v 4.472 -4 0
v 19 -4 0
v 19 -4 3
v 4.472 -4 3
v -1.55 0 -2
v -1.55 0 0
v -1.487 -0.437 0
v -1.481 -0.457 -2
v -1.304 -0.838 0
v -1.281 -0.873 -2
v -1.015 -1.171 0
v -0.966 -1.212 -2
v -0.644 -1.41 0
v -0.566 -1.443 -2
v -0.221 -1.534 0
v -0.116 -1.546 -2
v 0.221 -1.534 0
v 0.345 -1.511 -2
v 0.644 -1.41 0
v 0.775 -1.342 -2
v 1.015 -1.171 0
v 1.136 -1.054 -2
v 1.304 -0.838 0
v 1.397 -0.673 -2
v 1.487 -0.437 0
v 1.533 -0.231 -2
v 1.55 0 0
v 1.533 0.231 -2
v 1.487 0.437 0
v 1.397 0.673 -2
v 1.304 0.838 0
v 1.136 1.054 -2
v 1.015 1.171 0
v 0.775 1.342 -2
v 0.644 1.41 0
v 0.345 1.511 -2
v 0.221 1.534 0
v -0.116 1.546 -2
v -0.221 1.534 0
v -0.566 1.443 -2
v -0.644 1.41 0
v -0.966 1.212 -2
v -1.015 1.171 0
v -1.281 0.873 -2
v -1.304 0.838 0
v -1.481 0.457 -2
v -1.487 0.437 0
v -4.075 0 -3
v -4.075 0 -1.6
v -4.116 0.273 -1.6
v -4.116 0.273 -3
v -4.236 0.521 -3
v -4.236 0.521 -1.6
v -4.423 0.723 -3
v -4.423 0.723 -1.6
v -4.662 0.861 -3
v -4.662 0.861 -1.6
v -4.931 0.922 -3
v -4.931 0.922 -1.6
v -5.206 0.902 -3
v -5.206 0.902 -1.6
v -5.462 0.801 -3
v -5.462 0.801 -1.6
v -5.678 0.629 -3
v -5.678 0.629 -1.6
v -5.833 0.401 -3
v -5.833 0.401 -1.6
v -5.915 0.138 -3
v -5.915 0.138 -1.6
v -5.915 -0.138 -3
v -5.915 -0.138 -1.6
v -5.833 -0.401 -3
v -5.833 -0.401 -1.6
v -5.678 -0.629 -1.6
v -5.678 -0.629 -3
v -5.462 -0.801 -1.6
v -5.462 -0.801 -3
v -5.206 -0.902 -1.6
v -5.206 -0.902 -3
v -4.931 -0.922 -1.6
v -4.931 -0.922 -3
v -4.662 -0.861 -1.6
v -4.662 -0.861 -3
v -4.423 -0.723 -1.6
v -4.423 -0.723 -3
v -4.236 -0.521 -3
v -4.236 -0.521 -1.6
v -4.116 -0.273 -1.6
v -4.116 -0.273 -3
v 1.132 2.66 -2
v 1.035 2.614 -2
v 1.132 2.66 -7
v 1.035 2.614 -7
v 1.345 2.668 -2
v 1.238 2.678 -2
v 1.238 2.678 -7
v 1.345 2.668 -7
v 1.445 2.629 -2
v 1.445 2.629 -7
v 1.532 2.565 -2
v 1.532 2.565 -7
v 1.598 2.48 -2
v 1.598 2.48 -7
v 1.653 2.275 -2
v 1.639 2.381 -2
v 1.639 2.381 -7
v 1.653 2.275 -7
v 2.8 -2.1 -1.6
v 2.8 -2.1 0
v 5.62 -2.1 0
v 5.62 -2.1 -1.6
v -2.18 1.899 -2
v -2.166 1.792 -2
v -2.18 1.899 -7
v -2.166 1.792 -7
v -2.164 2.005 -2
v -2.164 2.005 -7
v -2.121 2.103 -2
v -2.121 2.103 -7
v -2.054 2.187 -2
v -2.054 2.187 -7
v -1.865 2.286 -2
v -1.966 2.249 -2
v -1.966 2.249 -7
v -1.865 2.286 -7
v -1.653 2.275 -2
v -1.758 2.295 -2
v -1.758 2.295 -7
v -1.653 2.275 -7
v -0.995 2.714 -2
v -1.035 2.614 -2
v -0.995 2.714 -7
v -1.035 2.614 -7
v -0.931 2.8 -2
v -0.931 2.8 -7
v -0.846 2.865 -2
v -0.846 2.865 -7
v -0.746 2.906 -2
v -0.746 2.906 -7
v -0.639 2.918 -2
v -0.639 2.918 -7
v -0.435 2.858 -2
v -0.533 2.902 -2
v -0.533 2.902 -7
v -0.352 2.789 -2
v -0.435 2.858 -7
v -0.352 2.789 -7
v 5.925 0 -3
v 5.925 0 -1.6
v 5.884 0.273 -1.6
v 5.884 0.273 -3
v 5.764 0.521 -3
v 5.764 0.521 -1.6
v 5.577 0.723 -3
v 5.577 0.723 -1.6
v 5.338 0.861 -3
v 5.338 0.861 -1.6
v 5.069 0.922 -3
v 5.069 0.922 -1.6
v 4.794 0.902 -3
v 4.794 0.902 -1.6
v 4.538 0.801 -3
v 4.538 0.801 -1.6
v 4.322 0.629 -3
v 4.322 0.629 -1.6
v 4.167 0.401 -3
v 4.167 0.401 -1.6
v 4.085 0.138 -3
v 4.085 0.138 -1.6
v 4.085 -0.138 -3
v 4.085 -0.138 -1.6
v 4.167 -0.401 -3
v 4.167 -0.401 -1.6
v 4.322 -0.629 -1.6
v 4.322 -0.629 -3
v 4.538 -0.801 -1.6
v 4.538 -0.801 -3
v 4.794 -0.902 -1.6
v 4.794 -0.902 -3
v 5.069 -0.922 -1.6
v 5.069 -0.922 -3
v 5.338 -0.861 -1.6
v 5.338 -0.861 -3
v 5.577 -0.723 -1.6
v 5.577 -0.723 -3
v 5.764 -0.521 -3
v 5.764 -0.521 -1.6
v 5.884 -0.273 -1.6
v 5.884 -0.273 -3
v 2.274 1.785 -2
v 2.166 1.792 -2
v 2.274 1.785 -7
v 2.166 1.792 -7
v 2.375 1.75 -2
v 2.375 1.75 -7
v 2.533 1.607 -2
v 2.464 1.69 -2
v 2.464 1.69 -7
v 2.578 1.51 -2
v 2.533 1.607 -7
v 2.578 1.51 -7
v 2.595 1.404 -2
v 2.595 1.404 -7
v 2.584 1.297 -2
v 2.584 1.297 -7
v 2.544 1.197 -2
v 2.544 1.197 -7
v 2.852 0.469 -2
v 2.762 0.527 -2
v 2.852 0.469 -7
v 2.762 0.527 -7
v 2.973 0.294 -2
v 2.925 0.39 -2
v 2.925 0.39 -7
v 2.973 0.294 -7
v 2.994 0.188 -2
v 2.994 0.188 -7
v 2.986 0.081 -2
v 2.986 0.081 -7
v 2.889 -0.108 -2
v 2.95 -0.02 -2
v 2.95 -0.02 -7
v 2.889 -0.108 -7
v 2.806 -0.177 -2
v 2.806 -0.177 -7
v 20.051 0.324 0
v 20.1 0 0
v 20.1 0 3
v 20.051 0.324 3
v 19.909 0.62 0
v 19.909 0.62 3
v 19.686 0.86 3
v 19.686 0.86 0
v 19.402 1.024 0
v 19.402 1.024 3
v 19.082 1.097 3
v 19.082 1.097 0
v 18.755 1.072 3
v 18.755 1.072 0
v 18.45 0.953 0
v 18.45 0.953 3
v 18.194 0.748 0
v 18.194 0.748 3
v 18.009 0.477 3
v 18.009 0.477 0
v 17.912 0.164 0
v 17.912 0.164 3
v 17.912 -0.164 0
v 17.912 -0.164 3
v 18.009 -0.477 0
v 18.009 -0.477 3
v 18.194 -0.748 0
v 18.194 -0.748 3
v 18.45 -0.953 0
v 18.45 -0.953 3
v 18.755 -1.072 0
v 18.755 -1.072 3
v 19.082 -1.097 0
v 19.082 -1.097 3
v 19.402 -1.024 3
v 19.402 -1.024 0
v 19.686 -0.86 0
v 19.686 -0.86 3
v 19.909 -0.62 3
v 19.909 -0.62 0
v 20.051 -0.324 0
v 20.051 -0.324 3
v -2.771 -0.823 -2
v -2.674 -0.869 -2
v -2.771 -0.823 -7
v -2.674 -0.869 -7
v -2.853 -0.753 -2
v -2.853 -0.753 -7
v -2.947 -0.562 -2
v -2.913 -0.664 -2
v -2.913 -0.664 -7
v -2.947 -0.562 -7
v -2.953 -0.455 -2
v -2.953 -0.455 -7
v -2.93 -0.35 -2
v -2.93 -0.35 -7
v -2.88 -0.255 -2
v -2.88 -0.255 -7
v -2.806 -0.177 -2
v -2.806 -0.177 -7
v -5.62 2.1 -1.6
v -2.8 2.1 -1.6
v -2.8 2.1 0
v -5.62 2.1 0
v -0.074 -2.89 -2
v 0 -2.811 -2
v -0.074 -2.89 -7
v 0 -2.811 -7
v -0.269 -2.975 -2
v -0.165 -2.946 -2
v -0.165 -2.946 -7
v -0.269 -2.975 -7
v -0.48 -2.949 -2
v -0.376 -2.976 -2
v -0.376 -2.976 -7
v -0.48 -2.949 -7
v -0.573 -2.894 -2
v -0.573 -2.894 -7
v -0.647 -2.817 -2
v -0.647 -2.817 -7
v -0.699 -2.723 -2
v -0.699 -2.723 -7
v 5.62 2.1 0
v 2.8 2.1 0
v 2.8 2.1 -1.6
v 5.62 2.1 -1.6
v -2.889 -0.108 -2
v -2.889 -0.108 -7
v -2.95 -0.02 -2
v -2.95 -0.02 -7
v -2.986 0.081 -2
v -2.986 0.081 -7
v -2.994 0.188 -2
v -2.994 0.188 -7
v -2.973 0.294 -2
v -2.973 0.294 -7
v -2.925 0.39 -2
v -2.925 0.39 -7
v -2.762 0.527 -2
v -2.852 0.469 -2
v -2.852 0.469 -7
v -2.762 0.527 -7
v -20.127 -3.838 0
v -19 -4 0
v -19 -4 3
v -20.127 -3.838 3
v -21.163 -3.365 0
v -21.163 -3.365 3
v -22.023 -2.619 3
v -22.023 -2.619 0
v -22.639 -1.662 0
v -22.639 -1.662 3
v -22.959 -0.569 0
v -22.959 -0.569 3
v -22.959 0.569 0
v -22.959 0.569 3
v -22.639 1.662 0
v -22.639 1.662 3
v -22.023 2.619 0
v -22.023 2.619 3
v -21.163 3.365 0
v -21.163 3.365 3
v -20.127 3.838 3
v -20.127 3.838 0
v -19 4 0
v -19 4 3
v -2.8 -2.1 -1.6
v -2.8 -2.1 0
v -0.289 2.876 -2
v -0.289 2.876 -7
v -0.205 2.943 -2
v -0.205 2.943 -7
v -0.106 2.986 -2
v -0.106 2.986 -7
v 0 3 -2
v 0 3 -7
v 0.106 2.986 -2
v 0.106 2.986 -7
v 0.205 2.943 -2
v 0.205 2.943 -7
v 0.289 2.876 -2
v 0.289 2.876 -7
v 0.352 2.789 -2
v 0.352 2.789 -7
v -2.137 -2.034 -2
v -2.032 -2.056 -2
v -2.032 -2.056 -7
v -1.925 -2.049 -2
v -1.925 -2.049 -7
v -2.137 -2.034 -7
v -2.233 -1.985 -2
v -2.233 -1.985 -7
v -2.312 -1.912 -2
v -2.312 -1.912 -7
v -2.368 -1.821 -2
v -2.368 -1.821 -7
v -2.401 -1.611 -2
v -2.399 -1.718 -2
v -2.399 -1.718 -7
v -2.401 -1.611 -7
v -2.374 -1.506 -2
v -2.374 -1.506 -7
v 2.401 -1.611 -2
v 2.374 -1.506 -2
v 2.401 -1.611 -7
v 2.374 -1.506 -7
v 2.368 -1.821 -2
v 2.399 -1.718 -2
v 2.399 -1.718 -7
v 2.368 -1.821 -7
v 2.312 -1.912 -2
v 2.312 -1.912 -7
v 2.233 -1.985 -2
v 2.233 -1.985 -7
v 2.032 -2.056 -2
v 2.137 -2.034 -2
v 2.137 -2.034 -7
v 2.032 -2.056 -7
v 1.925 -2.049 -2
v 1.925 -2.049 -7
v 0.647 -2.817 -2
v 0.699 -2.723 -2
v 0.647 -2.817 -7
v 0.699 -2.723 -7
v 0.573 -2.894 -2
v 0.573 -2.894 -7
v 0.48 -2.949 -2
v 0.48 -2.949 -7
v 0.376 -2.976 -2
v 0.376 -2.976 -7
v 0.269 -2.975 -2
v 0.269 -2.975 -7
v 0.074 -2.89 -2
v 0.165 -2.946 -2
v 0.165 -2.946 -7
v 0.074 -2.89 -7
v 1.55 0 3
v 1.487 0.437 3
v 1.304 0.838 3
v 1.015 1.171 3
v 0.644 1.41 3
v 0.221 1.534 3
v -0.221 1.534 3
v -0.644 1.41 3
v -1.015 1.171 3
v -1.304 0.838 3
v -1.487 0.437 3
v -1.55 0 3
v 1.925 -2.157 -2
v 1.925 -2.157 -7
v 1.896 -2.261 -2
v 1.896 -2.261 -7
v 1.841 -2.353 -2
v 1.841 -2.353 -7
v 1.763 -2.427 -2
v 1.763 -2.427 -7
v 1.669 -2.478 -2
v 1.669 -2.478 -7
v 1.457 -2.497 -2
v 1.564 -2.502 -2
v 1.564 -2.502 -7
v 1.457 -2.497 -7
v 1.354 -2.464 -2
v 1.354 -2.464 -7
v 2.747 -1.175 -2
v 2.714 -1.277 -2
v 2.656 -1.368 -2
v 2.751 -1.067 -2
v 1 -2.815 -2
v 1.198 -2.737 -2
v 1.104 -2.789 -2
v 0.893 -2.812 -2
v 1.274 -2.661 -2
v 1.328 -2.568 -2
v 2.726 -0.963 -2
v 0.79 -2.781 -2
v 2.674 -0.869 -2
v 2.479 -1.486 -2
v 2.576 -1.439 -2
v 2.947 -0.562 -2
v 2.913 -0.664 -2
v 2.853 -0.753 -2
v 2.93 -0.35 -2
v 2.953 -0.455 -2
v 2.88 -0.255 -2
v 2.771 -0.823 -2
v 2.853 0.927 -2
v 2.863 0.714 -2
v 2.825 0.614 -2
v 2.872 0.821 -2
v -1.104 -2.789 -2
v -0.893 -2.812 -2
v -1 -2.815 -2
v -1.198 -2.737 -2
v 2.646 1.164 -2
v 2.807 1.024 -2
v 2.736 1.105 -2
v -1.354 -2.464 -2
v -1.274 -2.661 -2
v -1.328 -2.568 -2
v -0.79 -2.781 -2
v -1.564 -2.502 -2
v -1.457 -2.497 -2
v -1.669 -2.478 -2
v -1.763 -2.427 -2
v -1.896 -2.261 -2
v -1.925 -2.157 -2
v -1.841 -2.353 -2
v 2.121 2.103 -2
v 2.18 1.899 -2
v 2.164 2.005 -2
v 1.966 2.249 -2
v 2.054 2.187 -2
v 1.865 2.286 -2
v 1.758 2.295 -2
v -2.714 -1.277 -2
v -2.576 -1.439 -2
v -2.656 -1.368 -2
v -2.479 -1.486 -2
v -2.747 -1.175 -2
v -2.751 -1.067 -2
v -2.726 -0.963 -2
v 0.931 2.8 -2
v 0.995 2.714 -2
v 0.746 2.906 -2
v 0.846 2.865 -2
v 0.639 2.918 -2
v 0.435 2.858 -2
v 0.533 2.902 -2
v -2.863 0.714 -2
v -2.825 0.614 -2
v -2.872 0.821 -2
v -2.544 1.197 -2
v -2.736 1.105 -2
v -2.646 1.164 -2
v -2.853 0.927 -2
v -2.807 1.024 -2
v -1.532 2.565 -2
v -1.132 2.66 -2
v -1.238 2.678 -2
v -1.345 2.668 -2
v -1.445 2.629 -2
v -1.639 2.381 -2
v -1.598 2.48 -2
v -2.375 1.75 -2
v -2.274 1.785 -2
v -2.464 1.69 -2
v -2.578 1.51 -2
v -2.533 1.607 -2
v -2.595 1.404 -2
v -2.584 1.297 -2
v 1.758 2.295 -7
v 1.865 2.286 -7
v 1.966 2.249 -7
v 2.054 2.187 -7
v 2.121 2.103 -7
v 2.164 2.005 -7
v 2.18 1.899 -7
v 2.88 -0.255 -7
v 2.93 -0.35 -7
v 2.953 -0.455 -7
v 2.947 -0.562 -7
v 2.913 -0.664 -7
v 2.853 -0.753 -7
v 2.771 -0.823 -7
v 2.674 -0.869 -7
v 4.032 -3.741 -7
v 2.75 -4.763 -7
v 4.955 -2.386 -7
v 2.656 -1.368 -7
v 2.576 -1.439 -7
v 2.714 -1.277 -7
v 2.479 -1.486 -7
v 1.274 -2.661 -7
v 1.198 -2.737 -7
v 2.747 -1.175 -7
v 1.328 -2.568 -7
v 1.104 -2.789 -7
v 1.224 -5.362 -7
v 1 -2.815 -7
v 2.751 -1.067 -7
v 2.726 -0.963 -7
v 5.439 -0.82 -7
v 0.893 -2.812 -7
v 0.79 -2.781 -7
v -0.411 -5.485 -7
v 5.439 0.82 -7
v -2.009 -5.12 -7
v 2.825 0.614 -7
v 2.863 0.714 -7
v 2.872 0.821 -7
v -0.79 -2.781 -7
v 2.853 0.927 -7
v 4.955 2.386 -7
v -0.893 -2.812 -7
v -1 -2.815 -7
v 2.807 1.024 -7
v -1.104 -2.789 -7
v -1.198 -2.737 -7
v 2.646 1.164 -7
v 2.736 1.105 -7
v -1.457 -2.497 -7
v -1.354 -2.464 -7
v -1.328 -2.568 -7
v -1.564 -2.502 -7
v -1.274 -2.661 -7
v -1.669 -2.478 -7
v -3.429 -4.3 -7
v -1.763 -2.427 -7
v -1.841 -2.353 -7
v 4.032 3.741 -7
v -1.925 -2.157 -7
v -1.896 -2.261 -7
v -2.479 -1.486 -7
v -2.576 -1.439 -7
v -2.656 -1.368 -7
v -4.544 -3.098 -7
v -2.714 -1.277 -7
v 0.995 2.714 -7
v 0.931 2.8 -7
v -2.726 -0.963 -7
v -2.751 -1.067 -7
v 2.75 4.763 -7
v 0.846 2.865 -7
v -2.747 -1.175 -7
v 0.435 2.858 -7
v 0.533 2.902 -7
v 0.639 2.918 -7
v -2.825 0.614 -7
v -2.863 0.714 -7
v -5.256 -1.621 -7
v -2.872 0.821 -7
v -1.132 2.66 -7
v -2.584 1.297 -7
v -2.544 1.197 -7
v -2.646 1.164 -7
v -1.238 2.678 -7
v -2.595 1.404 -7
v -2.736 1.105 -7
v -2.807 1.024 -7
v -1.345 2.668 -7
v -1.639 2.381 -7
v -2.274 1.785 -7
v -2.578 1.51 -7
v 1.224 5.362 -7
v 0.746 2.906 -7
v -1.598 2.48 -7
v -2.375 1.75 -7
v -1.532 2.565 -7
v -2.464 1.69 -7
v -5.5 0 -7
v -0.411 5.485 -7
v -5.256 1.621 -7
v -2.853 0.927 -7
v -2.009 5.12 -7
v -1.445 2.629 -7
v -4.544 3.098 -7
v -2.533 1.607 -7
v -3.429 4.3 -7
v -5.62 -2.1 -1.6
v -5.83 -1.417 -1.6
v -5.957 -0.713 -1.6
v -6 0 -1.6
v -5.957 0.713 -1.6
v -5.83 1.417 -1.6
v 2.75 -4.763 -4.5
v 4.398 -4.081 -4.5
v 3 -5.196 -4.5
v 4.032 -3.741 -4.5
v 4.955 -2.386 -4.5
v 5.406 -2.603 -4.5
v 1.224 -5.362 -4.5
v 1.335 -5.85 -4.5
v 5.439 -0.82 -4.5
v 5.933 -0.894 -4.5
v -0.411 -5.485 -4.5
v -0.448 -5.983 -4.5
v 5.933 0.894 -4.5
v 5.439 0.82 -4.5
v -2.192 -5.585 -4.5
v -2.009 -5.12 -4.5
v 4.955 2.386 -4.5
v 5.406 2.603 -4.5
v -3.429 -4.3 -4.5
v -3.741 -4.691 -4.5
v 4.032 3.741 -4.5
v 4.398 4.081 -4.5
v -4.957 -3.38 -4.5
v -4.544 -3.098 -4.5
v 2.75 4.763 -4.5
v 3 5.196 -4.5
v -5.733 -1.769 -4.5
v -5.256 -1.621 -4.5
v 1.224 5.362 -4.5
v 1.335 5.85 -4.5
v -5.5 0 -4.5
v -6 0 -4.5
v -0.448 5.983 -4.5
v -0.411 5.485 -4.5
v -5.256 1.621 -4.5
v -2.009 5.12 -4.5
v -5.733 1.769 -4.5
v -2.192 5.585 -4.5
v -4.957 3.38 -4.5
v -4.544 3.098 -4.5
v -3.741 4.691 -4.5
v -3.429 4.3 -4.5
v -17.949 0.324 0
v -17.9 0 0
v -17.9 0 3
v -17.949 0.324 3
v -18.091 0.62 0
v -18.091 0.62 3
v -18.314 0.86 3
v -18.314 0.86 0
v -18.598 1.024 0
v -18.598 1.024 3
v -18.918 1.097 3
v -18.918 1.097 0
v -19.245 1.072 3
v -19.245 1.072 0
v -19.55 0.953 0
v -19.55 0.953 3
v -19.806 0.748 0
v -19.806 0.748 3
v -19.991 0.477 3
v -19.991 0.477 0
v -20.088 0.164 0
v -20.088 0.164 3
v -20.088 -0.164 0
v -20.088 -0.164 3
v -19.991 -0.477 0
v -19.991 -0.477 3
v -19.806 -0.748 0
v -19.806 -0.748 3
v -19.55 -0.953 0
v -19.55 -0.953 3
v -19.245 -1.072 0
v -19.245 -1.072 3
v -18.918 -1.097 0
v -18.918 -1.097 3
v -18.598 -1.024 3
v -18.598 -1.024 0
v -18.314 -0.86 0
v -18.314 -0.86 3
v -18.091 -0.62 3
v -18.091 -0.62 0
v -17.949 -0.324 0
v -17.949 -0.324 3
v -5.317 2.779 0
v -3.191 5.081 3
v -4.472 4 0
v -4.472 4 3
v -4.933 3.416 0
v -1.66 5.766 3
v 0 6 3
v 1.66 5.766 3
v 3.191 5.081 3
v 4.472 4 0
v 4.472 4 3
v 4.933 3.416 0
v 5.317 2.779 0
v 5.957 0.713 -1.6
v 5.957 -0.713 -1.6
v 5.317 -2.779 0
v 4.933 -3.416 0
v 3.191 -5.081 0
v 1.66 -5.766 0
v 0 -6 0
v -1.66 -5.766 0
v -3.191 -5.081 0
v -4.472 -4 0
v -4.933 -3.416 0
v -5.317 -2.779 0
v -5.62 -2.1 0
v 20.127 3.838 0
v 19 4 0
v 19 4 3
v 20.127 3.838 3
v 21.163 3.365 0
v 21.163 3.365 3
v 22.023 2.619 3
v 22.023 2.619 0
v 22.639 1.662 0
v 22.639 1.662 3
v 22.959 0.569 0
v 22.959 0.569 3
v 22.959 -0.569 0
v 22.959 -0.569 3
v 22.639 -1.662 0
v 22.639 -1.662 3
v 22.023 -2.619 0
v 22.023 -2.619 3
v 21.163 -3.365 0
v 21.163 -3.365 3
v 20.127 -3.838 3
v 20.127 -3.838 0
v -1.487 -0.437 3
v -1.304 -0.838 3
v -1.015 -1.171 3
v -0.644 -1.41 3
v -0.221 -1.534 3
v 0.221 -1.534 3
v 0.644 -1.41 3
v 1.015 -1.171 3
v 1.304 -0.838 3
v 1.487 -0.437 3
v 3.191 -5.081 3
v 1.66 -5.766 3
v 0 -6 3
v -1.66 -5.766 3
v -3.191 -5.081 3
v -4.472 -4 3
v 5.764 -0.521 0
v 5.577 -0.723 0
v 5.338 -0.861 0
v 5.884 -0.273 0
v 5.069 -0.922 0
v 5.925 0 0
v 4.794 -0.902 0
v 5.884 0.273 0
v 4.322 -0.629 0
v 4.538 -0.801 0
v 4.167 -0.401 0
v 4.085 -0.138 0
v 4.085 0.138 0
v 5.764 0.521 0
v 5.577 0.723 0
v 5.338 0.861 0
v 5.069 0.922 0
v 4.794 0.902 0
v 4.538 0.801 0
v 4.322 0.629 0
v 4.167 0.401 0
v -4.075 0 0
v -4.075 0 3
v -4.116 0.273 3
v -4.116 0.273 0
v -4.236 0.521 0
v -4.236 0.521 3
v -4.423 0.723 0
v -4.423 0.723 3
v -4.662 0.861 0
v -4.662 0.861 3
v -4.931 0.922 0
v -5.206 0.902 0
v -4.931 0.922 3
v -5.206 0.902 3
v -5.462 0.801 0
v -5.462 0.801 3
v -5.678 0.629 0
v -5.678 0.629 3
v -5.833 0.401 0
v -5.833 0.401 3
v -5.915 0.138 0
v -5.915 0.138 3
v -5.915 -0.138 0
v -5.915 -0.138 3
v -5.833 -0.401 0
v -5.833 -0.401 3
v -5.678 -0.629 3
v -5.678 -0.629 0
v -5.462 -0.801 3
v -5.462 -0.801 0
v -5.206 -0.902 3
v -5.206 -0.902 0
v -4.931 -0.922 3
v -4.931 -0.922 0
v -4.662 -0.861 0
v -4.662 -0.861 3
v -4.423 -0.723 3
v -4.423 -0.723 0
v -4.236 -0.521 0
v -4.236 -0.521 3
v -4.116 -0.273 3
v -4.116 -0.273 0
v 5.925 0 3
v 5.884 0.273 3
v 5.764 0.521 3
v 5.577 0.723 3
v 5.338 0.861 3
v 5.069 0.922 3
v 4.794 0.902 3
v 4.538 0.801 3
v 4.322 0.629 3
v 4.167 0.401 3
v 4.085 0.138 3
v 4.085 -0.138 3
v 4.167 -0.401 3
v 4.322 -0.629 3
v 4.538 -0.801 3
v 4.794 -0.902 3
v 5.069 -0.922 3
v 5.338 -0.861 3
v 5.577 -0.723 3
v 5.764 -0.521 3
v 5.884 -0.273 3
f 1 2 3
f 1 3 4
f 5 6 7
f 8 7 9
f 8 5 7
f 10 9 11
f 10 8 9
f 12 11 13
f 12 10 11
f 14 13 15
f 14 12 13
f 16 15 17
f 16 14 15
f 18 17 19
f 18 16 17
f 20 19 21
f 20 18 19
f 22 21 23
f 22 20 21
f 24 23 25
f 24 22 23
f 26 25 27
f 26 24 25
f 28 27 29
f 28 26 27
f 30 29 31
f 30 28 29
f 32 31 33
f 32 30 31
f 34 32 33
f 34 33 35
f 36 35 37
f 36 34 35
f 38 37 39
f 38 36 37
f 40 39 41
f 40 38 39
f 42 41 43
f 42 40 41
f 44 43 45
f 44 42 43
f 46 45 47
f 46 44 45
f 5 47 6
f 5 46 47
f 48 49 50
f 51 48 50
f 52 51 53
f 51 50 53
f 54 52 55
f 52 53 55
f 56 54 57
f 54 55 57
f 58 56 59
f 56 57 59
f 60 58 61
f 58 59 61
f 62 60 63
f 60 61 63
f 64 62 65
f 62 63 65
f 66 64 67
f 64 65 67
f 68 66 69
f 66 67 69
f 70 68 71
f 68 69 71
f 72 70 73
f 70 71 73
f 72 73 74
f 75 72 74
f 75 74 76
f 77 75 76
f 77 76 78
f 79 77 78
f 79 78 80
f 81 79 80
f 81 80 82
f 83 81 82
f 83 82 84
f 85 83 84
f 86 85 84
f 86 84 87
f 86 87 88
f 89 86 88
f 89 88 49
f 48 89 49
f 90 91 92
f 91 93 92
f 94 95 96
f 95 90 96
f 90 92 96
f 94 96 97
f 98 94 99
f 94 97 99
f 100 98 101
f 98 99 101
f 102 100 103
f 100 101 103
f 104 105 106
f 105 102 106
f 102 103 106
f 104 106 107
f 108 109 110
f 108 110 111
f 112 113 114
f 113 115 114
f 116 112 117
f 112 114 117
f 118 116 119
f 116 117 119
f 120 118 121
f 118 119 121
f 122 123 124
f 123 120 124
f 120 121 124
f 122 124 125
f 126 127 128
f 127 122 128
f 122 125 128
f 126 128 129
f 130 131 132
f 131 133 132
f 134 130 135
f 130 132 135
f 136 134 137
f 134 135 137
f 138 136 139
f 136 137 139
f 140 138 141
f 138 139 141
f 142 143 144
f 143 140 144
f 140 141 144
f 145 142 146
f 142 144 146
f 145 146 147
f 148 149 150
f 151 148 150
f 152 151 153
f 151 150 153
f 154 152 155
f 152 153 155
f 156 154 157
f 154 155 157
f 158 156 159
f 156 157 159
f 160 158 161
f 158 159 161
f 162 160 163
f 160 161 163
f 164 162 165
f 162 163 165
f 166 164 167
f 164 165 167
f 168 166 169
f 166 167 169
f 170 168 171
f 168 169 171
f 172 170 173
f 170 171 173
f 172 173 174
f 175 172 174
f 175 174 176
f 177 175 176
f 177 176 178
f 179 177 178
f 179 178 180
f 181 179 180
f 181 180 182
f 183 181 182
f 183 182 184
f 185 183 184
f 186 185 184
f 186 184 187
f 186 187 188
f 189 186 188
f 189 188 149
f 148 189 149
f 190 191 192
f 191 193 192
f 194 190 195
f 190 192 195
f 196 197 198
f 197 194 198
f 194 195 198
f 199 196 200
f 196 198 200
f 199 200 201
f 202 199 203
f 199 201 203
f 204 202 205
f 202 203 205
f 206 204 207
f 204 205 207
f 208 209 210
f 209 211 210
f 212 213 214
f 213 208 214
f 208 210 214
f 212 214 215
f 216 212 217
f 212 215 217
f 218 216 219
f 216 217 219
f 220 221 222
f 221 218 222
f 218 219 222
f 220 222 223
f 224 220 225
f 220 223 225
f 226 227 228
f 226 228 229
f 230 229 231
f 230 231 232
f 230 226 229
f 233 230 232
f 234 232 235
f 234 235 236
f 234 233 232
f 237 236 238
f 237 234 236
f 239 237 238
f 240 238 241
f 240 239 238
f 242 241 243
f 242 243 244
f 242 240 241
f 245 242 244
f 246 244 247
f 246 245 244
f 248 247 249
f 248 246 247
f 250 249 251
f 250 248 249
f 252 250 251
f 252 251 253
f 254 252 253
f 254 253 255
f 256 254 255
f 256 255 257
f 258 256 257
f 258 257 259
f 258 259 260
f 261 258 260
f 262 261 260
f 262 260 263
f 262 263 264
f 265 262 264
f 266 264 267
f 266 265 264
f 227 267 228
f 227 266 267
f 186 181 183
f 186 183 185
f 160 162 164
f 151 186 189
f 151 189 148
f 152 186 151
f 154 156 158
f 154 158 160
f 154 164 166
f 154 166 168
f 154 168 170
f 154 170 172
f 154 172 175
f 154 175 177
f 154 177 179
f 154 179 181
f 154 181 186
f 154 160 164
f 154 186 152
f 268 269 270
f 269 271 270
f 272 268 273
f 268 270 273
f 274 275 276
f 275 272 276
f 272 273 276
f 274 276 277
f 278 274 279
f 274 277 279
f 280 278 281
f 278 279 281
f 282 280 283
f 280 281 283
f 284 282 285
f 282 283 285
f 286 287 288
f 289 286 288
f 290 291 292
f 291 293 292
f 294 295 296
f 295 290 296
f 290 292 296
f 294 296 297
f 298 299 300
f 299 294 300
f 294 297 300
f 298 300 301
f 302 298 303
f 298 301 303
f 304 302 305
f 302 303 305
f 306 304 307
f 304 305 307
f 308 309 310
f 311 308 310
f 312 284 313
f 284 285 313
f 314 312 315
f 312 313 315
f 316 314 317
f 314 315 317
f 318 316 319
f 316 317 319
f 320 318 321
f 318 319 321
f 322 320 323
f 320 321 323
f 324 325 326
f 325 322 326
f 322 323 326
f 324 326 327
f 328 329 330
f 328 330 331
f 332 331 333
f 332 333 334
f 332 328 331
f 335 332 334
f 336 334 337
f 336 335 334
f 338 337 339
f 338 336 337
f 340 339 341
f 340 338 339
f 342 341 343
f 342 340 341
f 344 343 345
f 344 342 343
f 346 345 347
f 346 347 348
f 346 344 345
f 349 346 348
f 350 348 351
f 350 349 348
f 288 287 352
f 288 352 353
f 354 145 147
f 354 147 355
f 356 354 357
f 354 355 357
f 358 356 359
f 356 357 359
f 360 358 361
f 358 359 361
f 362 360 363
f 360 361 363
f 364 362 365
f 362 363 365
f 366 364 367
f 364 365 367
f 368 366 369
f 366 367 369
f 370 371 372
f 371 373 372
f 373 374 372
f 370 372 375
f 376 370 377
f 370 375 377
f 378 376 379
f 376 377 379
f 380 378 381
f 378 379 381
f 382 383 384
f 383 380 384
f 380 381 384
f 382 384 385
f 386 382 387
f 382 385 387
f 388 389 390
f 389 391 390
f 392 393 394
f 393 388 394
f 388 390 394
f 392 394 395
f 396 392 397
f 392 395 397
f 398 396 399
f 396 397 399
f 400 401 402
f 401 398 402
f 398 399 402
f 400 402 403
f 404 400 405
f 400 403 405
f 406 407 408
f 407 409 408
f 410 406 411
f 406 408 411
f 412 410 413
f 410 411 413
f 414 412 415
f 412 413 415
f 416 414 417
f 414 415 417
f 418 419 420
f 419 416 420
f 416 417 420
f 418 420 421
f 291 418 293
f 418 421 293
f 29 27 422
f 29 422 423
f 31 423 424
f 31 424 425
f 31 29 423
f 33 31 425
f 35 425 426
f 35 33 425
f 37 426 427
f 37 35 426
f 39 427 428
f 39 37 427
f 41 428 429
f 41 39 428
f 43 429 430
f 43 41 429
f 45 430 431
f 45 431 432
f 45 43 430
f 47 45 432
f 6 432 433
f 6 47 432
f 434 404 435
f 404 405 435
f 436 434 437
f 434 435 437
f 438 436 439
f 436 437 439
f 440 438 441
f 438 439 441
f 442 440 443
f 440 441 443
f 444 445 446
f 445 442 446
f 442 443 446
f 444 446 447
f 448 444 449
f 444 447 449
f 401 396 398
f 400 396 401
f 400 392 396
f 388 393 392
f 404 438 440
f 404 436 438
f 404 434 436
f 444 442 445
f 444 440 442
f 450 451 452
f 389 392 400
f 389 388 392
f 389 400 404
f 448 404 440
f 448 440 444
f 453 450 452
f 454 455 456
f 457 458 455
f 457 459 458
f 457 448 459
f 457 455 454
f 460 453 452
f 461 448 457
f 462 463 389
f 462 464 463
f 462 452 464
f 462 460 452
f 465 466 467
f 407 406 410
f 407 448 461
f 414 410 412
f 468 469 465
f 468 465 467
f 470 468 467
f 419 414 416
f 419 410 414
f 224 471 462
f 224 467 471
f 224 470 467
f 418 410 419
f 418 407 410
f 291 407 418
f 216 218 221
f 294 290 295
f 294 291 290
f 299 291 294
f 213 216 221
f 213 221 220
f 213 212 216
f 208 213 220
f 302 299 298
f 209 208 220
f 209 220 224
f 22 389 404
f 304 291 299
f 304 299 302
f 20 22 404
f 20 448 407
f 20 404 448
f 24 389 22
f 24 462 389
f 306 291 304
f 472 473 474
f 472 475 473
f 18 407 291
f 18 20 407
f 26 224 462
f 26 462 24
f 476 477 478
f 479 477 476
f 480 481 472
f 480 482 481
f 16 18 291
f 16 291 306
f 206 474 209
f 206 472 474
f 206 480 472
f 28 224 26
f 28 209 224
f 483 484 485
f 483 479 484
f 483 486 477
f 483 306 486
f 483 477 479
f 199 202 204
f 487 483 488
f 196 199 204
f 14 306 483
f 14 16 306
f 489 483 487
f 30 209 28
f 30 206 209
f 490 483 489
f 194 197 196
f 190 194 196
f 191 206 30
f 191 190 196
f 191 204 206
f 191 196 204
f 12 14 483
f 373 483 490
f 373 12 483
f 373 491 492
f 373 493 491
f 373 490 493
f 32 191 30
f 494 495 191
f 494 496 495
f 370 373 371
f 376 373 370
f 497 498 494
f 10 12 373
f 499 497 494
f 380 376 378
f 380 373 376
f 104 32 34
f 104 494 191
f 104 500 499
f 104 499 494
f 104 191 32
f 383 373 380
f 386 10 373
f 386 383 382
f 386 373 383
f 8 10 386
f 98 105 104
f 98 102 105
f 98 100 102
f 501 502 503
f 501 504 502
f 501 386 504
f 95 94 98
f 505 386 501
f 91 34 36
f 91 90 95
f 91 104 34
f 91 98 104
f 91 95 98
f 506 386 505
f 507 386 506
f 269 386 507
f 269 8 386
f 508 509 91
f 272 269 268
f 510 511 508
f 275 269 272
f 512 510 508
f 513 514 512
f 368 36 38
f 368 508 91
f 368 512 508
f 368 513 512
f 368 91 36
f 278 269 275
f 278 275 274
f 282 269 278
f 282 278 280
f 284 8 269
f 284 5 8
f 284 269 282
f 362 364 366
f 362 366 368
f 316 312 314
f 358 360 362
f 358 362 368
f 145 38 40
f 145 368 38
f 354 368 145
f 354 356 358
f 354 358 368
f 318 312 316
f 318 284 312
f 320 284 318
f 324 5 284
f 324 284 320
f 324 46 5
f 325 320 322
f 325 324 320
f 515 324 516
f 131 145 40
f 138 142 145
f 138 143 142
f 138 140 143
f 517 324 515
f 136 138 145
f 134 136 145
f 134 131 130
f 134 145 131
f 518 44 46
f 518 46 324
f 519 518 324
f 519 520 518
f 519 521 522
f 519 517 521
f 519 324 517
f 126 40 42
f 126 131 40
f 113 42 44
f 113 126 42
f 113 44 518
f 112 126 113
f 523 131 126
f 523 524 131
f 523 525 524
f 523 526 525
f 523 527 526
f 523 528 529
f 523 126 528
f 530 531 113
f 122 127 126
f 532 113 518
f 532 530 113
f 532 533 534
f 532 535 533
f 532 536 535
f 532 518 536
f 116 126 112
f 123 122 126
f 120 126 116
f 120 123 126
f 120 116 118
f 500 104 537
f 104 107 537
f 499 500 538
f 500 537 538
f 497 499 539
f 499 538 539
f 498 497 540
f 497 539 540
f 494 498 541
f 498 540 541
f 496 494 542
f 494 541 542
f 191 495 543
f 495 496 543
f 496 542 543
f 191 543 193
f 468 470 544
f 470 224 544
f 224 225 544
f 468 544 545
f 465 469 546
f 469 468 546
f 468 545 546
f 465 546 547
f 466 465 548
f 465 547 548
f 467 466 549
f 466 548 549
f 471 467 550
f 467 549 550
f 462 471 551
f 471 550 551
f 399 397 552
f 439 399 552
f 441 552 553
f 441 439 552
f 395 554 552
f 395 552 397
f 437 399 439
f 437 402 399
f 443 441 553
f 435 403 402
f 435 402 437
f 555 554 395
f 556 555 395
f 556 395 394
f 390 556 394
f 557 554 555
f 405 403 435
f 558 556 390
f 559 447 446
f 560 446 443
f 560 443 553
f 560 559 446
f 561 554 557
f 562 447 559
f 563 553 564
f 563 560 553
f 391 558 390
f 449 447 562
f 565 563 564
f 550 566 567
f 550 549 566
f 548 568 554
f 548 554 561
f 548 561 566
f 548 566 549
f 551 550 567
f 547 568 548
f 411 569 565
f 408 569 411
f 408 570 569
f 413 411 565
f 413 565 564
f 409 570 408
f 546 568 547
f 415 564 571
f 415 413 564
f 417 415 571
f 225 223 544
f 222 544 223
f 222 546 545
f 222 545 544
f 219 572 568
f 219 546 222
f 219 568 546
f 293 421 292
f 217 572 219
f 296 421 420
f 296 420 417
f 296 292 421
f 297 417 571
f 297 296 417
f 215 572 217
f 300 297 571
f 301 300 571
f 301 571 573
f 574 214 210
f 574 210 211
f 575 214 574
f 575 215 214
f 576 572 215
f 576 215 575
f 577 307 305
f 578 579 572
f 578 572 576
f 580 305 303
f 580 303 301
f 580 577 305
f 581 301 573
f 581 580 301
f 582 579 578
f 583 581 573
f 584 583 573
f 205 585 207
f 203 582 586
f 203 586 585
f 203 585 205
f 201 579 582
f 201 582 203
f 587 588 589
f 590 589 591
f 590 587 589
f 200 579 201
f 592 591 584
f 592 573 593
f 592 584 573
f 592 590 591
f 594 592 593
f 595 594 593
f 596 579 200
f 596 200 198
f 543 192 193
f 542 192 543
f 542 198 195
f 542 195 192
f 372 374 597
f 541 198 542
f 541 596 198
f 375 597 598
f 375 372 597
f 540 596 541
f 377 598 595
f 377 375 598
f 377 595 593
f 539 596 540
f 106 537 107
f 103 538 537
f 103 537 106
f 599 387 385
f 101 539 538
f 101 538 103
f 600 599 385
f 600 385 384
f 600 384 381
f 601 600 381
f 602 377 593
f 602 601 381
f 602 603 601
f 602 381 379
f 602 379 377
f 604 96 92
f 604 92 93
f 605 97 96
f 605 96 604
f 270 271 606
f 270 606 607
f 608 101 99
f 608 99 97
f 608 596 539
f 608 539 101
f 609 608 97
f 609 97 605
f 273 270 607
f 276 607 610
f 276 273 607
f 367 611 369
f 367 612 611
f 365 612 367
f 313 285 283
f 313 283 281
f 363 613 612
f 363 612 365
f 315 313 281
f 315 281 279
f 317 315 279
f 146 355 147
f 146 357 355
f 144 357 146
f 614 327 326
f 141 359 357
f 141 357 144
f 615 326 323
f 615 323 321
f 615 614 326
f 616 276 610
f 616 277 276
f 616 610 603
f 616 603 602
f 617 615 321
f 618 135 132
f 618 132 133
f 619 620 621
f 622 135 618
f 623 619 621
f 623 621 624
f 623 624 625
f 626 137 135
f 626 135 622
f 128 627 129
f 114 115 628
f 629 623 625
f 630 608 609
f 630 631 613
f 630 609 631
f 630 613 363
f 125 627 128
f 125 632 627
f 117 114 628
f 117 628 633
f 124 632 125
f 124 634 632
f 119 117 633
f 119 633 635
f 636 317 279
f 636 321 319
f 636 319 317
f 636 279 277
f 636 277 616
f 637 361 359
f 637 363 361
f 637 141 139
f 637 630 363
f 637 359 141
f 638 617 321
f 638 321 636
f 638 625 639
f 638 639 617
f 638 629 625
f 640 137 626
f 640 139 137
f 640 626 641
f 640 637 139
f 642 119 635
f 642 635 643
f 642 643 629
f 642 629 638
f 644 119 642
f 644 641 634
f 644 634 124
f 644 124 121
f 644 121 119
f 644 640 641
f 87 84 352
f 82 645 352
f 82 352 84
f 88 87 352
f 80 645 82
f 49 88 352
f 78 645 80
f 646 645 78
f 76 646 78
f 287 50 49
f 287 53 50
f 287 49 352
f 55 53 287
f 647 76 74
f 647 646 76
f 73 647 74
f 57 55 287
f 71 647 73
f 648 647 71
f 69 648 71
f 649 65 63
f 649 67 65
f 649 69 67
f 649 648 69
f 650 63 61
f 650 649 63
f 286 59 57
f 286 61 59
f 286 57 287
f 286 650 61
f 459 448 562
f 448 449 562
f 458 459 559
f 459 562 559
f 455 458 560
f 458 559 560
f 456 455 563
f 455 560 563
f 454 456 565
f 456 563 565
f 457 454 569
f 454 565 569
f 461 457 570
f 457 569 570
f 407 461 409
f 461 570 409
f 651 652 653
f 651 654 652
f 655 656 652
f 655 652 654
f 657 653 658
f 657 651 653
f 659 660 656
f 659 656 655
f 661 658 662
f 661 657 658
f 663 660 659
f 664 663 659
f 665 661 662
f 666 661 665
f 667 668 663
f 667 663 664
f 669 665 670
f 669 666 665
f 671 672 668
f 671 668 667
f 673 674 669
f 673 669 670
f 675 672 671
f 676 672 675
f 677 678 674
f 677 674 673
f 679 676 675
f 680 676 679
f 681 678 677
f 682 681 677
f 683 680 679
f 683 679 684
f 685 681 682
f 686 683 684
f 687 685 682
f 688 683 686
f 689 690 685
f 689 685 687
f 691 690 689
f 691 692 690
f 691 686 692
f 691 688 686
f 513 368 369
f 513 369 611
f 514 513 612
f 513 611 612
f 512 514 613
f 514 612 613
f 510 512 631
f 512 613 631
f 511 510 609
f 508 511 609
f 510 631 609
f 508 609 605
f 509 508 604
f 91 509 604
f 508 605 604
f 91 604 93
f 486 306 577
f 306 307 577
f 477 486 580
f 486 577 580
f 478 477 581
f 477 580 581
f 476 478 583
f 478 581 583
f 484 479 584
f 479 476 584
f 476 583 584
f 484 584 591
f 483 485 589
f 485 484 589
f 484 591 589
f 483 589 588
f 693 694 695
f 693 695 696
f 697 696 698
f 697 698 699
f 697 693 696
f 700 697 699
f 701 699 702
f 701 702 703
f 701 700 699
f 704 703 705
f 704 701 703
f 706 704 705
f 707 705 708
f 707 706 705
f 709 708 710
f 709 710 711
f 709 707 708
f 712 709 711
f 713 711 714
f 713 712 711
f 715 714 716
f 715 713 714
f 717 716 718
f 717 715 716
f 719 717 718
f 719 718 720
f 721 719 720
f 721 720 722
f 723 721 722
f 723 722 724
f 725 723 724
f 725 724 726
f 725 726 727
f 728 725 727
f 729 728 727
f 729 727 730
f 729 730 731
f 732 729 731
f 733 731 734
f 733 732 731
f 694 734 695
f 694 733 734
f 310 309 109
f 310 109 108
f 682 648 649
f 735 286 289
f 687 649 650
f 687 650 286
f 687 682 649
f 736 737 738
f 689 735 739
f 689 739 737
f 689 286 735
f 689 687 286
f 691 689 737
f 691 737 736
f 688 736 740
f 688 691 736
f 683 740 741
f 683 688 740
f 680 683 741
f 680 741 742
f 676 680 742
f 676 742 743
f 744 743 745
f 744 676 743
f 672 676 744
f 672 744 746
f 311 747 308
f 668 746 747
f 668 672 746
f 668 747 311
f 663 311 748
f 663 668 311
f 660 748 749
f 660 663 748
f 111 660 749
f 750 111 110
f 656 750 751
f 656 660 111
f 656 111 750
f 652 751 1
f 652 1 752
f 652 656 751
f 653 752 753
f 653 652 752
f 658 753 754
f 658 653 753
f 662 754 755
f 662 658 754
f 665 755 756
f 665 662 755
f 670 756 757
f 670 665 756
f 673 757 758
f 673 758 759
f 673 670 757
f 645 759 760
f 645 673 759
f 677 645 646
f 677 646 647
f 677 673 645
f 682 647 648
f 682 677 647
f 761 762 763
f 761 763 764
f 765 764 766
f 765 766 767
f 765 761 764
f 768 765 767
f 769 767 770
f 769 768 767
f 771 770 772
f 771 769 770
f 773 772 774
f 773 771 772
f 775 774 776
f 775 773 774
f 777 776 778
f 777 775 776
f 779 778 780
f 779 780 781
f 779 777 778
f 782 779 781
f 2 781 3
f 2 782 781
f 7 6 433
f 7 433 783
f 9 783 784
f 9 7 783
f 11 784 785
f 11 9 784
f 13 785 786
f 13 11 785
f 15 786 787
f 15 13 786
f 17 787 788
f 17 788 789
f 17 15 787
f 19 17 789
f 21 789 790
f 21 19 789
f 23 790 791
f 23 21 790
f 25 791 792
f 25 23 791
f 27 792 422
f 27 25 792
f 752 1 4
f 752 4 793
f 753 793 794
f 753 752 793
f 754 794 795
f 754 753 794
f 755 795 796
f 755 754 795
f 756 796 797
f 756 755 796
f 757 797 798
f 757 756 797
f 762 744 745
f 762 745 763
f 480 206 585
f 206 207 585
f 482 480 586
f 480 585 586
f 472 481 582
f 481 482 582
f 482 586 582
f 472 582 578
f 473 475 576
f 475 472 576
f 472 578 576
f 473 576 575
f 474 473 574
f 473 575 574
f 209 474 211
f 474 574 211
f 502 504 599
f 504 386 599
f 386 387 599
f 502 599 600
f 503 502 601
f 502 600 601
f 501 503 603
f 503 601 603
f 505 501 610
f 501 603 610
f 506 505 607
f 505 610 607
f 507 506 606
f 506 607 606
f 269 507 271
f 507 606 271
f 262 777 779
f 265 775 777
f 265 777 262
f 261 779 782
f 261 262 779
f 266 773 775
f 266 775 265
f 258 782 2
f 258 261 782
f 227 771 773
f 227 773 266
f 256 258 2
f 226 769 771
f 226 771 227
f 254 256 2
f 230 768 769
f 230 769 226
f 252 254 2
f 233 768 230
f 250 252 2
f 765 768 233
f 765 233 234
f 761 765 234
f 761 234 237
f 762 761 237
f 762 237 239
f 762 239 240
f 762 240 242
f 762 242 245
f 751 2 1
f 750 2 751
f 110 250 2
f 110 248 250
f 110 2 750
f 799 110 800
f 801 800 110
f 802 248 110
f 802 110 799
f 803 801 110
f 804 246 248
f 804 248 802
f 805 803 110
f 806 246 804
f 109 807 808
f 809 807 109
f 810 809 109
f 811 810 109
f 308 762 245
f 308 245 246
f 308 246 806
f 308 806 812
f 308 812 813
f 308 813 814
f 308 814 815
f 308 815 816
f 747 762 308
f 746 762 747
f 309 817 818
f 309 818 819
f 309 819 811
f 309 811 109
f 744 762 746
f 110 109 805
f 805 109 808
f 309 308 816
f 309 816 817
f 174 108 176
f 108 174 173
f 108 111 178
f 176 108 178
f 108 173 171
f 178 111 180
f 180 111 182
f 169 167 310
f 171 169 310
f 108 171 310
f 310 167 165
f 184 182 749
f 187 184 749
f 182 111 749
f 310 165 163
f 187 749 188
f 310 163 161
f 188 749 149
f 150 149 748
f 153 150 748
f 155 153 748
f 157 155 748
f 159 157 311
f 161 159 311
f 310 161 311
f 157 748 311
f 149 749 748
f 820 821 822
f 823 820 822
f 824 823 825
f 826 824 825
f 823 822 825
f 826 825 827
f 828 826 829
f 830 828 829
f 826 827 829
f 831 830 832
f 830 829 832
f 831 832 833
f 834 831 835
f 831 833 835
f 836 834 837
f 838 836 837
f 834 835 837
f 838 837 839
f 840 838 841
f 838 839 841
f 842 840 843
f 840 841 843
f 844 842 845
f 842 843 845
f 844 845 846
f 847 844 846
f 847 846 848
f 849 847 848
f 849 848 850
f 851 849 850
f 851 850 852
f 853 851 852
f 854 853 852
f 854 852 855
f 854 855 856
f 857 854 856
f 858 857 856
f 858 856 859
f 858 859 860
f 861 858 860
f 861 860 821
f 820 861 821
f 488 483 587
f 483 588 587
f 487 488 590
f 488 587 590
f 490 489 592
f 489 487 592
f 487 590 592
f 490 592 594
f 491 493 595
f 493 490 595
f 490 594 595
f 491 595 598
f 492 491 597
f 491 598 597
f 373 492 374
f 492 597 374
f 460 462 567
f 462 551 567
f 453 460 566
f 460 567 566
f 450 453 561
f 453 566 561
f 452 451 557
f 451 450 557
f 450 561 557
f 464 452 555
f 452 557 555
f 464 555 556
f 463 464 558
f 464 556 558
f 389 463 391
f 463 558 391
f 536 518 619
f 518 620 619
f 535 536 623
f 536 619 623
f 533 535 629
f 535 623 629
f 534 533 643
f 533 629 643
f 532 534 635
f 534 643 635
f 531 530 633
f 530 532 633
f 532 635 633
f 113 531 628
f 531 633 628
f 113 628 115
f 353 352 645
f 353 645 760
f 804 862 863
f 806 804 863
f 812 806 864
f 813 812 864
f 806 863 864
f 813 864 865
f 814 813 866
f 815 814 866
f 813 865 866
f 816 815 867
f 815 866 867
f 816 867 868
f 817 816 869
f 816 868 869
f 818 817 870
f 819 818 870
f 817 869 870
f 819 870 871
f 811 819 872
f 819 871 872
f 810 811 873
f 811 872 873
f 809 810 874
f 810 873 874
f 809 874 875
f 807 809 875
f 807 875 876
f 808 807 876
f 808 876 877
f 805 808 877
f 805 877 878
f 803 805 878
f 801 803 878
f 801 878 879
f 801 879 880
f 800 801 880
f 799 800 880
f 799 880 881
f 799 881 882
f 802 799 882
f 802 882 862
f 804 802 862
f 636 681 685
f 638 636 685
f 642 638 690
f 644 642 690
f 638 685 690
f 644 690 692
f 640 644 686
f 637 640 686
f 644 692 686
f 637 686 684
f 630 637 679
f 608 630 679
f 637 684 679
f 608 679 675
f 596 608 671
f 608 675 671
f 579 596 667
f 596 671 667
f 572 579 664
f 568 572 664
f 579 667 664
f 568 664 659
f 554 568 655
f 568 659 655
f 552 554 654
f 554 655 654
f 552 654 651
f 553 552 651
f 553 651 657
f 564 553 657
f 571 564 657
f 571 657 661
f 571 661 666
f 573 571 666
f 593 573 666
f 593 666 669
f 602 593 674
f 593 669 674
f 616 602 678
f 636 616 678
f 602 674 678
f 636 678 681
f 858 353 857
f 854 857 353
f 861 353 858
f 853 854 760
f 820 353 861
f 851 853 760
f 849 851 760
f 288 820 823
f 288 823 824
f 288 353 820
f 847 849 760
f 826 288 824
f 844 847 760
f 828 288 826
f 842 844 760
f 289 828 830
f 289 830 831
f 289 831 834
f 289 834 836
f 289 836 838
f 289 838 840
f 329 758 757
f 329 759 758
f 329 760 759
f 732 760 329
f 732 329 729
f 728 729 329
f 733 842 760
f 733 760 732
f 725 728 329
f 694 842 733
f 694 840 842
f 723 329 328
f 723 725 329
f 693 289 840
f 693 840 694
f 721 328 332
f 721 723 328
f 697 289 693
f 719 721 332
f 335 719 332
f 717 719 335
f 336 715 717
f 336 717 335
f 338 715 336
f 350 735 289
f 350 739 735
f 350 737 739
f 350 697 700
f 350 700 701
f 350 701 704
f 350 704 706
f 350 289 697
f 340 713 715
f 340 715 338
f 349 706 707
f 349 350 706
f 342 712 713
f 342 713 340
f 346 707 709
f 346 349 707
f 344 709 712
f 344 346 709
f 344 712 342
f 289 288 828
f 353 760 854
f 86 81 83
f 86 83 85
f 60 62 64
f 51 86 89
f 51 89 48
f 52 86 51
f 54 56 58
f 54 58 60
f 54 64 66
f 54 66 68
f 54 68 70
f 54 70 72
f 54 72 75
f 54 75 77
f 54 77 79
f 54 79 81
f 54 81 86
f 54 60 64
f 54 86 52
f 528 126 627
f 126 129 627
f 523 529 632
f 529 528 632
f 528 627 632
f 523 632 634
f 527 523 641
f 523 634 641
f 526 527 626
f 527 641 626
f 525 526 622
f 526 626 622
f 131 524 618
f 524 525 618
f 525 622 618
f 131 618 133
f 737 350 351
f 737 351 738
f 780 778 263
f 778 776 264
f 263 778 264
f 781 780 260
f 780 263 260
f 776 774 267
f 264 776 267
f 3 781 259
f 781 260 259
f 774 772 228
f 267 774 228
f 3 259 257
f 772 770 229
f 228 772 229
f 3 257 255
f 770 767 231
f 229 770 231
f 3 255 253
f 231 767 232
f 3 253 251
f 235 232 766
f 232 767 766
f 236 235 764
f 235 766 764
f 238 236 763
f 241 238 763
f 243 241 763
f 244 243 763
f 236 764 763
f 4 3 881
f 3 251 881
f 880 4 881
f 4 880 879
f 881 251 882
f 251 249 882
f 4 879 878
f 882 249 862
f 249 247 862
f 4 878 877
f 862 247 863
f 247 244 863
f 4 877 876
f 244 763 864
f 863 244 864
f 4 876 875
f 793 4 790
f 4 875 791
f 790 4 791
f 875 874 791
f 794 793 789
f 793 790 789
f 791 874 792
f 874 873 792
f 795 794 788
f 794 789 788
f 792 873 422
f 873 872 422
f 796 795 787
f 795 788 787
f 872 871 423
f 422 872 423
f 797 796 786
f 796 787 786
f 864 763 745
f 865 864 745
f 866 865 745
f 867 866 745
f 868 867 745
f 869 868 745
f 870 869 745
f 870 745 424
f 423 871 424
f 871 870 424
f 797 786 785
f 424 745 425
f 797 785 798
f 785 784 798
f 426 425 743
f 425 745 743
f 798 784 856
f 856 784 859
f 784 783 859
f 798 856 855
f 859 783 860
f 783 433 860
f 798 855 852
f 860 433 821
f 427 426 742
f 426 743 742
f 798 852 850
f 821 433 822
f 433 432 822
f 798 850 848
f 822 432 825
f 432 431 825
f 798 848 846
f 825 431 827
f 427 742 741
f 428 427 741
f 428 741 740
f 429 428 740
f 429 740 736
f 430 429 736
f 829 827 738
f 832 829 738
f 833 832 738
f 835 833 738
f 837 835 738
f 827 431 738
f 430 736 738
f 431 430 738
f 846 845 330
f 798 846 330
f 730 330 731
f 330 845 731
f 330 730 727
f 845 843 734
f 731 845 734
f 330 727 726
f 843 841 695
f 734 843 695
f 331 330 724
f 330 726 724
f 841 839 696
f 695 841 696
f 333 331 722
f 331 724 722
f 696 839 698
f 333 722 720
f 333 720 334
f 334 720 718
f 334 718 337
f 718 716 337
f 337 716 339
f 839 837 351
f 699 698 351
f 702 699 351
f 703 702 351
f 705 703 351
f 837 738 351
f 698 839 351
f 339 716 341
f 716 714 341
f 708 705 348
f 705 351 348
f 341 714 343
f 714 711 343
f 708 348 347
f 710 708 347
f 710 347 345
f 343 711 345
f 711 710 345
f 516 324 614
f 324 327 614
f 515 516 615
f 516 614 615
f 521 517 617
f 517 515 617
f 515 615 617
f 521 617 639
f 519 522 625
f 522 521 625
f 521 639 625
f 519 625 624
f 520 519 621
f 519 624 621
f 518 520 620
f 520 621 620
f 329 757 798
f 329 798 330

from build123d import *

# Parameters (mm, degrees)
SKETCH_1_R               = 1.55
SKETCH_1_R_2             = 1.1
EXTRUDE_1_DEPTH          = 3
EXTRUDE_START            = 4.5
SKETCH_2_R               = 6
EXTRUDE_2_DEPTH          = 4.5
SKETCH_3_R               = 5.5
EXTRUDE_3_DEPTH          = 2.5
SKETCH_5_R               = 0.4
CUT_EXTRUDE_1_DEPTH      = 5
PATTERN_CIRCULAR_2_COUNT = 25
SKETCH_4_R               = 2.6
CUT_EXTRUDE_2_DEPTH      = 5
CUT_EXTRUDE_START        = -30
SKETCH_6_R               = 1.55
CUT_EXTRUDE_3_DEPTH      = 30
SKETCH_7_R               = 0.925
CUT_EXTRUDE_4_DEPTH      = 6
SKETCH_8_W               = 1.6
SKETCH_8_H               = 4.2
CUT_EXTRUDE_5_DEPTH      = 3.2
SKETCH_9_W               = 1.6
SKETCH_9_H               = 4.2
CUT_EXTRUDE_6_DEPTH      = 3.2


with BuildPart() as part:
    # 草图1 → 凸台-拉伸1 (new body)
    with BuildSketch(Plane.XY):
        with BuildLine():
            Line((4.472135955, 4), (19, 4))
            ThreePointArc((19, 4), (23, 0), (19, -4))
            Line((19, -4), (4.472135955, -4))
            ThreePointArc((4.472135955, -4), (0, -6), (-4.472135955, -4))
            Line((-4.472135955, -4), (-19, -4))
            ThreePointArc((-19, -4), (-23, 0), (-19, 4))
            Line((-19, 4), (-4.472135955, 4))
            ThreePointArc((-4.472135955, 4), (0, 6), (4.472135955, 4))
        make_face()
        Circle(SKETCH_1_R, mode=Mode.SUBTRACT)
        with Locations((19, 0)):
            Circle(SKETCH_1_R_2, mode=Mode.SUBTRACT)
        with Locations((-19, 0)):
            Circle(SKETCH_1_R_2, mode=Mode.SUBTRACT)
    extrude(amount=EXTRUDE_1_DEPTH)

    # 草图2 → 凸台-拉伸2 (add)
    with BuildSketch(Plane(origin=(0, 0, 0), x_dir=(-1, 0, 0), z_dir=(0, 0, -1)).offset(EXTRUDE_START)):
        Circle(SKETCH_2_R)
    extrude(amount=-EXTRUDE_2_DEPTH)

    # 草图3 → 凸台-拉伸3 (add)
    with BuildSketch(Plane(origin=(0, 0, -4.5), x_dir=(-1, 0, 0), z_dir=(0, 0, -1))):
        Circle(SKETCH_3_R)
    extrude(amount=EXTRUDE_3_DEPTH)

    # 草图5 → 切除-拉伸1 (cut)
    with BuildSketch(Plane(origin=(0, 0, -7), x_dir=(-1, 0, 0), z_dir=(0, 0, -1))):
        with Locations((0, 2.6)):
            Circle(SKETCH_5_R)
    cut_extrude_1 = extrude(amount=-CUT_EXTRUDE_1_DEPTH, mode=Mode.SUBTRACT)

    # 阵列(圆周)2: 切除-拉伸1 ×25 about axis
    pattern_circular_2_axis = Axis((0, 0, 0), (0, 0, 1))
    for i in range(1, PATTERN_CIRCULAR_2_COUNT):
        add(cut_extrude_1.rotate(pattern_circular_2_axis, i * 360 / PATTERN_CIRCULAR_2_COUNT), mode=Mode.SUBTRACT)

    # 草图4 → 切除-拉伸2 (cut)
    with BuildSketch(Plane(origin=(0, 0, -7), x_dir=(-1, 0, 0), z_dir=(0, 0, -1))):
        Circle(SKETCH_4_R)
    extrude(amount=-CUT_EXTRUDE_2_DEPTH, mode=Mode.SUBTRACT)

    # 草图6 → 切除-拉伸3 (cut)
    with BuildSketch(Plane.XY.offset(3).offset(CUT_EXTRUDE_START)):
        with Locations(Location((0, 0, 0), (0, 0, 180))):
            Circle(SKETCH_6_R)
    extrude(amount=CUT_EXTRUDE_3_DEPTH, mode=Mode.SUBTRACT)

    # 草图7 → 切除-拉伸4 (cut)
    with BuildSketch(Plane.XY.offset(3)):
        with Locations((5, 0)):
            Circle(SKETCH_7_R)
        with Locations((-5, 0)):
            Circle(SKETCH_7_R)
    extrude(amount=-CUT_EXTRUDE_4_DEPTH, mode=Mode.SUBTRACT)

    # 草图8 → 切除-拉伸5 (cut)
    with BuildSketch(Plane(origin=(6, 0, 0), x_dir=(0, 0, -1), z_dir=(1, 0, 0))):
        with Locations((0.8, 0)):
            Rectangle(SKETCH_8_W, SKETCH_8_H)
    extrude(amount=-CUT_EXTRUDE_5_DEPTH, mode=Mode.SUBTRACT)

    # 草图9 → 切除-拉伸6 (cut)
    with BuildSketch(Plane.ZY.offset(6)):
        with Locations((-0.8, 0)):
            Rectangle(SKETCH_9_W, SKETCH_9_H)
    extrude(amount=-CUT_EXTRUDE_6_DEPTH, mode=Mode.SUBTRACT)


solid = part.part
